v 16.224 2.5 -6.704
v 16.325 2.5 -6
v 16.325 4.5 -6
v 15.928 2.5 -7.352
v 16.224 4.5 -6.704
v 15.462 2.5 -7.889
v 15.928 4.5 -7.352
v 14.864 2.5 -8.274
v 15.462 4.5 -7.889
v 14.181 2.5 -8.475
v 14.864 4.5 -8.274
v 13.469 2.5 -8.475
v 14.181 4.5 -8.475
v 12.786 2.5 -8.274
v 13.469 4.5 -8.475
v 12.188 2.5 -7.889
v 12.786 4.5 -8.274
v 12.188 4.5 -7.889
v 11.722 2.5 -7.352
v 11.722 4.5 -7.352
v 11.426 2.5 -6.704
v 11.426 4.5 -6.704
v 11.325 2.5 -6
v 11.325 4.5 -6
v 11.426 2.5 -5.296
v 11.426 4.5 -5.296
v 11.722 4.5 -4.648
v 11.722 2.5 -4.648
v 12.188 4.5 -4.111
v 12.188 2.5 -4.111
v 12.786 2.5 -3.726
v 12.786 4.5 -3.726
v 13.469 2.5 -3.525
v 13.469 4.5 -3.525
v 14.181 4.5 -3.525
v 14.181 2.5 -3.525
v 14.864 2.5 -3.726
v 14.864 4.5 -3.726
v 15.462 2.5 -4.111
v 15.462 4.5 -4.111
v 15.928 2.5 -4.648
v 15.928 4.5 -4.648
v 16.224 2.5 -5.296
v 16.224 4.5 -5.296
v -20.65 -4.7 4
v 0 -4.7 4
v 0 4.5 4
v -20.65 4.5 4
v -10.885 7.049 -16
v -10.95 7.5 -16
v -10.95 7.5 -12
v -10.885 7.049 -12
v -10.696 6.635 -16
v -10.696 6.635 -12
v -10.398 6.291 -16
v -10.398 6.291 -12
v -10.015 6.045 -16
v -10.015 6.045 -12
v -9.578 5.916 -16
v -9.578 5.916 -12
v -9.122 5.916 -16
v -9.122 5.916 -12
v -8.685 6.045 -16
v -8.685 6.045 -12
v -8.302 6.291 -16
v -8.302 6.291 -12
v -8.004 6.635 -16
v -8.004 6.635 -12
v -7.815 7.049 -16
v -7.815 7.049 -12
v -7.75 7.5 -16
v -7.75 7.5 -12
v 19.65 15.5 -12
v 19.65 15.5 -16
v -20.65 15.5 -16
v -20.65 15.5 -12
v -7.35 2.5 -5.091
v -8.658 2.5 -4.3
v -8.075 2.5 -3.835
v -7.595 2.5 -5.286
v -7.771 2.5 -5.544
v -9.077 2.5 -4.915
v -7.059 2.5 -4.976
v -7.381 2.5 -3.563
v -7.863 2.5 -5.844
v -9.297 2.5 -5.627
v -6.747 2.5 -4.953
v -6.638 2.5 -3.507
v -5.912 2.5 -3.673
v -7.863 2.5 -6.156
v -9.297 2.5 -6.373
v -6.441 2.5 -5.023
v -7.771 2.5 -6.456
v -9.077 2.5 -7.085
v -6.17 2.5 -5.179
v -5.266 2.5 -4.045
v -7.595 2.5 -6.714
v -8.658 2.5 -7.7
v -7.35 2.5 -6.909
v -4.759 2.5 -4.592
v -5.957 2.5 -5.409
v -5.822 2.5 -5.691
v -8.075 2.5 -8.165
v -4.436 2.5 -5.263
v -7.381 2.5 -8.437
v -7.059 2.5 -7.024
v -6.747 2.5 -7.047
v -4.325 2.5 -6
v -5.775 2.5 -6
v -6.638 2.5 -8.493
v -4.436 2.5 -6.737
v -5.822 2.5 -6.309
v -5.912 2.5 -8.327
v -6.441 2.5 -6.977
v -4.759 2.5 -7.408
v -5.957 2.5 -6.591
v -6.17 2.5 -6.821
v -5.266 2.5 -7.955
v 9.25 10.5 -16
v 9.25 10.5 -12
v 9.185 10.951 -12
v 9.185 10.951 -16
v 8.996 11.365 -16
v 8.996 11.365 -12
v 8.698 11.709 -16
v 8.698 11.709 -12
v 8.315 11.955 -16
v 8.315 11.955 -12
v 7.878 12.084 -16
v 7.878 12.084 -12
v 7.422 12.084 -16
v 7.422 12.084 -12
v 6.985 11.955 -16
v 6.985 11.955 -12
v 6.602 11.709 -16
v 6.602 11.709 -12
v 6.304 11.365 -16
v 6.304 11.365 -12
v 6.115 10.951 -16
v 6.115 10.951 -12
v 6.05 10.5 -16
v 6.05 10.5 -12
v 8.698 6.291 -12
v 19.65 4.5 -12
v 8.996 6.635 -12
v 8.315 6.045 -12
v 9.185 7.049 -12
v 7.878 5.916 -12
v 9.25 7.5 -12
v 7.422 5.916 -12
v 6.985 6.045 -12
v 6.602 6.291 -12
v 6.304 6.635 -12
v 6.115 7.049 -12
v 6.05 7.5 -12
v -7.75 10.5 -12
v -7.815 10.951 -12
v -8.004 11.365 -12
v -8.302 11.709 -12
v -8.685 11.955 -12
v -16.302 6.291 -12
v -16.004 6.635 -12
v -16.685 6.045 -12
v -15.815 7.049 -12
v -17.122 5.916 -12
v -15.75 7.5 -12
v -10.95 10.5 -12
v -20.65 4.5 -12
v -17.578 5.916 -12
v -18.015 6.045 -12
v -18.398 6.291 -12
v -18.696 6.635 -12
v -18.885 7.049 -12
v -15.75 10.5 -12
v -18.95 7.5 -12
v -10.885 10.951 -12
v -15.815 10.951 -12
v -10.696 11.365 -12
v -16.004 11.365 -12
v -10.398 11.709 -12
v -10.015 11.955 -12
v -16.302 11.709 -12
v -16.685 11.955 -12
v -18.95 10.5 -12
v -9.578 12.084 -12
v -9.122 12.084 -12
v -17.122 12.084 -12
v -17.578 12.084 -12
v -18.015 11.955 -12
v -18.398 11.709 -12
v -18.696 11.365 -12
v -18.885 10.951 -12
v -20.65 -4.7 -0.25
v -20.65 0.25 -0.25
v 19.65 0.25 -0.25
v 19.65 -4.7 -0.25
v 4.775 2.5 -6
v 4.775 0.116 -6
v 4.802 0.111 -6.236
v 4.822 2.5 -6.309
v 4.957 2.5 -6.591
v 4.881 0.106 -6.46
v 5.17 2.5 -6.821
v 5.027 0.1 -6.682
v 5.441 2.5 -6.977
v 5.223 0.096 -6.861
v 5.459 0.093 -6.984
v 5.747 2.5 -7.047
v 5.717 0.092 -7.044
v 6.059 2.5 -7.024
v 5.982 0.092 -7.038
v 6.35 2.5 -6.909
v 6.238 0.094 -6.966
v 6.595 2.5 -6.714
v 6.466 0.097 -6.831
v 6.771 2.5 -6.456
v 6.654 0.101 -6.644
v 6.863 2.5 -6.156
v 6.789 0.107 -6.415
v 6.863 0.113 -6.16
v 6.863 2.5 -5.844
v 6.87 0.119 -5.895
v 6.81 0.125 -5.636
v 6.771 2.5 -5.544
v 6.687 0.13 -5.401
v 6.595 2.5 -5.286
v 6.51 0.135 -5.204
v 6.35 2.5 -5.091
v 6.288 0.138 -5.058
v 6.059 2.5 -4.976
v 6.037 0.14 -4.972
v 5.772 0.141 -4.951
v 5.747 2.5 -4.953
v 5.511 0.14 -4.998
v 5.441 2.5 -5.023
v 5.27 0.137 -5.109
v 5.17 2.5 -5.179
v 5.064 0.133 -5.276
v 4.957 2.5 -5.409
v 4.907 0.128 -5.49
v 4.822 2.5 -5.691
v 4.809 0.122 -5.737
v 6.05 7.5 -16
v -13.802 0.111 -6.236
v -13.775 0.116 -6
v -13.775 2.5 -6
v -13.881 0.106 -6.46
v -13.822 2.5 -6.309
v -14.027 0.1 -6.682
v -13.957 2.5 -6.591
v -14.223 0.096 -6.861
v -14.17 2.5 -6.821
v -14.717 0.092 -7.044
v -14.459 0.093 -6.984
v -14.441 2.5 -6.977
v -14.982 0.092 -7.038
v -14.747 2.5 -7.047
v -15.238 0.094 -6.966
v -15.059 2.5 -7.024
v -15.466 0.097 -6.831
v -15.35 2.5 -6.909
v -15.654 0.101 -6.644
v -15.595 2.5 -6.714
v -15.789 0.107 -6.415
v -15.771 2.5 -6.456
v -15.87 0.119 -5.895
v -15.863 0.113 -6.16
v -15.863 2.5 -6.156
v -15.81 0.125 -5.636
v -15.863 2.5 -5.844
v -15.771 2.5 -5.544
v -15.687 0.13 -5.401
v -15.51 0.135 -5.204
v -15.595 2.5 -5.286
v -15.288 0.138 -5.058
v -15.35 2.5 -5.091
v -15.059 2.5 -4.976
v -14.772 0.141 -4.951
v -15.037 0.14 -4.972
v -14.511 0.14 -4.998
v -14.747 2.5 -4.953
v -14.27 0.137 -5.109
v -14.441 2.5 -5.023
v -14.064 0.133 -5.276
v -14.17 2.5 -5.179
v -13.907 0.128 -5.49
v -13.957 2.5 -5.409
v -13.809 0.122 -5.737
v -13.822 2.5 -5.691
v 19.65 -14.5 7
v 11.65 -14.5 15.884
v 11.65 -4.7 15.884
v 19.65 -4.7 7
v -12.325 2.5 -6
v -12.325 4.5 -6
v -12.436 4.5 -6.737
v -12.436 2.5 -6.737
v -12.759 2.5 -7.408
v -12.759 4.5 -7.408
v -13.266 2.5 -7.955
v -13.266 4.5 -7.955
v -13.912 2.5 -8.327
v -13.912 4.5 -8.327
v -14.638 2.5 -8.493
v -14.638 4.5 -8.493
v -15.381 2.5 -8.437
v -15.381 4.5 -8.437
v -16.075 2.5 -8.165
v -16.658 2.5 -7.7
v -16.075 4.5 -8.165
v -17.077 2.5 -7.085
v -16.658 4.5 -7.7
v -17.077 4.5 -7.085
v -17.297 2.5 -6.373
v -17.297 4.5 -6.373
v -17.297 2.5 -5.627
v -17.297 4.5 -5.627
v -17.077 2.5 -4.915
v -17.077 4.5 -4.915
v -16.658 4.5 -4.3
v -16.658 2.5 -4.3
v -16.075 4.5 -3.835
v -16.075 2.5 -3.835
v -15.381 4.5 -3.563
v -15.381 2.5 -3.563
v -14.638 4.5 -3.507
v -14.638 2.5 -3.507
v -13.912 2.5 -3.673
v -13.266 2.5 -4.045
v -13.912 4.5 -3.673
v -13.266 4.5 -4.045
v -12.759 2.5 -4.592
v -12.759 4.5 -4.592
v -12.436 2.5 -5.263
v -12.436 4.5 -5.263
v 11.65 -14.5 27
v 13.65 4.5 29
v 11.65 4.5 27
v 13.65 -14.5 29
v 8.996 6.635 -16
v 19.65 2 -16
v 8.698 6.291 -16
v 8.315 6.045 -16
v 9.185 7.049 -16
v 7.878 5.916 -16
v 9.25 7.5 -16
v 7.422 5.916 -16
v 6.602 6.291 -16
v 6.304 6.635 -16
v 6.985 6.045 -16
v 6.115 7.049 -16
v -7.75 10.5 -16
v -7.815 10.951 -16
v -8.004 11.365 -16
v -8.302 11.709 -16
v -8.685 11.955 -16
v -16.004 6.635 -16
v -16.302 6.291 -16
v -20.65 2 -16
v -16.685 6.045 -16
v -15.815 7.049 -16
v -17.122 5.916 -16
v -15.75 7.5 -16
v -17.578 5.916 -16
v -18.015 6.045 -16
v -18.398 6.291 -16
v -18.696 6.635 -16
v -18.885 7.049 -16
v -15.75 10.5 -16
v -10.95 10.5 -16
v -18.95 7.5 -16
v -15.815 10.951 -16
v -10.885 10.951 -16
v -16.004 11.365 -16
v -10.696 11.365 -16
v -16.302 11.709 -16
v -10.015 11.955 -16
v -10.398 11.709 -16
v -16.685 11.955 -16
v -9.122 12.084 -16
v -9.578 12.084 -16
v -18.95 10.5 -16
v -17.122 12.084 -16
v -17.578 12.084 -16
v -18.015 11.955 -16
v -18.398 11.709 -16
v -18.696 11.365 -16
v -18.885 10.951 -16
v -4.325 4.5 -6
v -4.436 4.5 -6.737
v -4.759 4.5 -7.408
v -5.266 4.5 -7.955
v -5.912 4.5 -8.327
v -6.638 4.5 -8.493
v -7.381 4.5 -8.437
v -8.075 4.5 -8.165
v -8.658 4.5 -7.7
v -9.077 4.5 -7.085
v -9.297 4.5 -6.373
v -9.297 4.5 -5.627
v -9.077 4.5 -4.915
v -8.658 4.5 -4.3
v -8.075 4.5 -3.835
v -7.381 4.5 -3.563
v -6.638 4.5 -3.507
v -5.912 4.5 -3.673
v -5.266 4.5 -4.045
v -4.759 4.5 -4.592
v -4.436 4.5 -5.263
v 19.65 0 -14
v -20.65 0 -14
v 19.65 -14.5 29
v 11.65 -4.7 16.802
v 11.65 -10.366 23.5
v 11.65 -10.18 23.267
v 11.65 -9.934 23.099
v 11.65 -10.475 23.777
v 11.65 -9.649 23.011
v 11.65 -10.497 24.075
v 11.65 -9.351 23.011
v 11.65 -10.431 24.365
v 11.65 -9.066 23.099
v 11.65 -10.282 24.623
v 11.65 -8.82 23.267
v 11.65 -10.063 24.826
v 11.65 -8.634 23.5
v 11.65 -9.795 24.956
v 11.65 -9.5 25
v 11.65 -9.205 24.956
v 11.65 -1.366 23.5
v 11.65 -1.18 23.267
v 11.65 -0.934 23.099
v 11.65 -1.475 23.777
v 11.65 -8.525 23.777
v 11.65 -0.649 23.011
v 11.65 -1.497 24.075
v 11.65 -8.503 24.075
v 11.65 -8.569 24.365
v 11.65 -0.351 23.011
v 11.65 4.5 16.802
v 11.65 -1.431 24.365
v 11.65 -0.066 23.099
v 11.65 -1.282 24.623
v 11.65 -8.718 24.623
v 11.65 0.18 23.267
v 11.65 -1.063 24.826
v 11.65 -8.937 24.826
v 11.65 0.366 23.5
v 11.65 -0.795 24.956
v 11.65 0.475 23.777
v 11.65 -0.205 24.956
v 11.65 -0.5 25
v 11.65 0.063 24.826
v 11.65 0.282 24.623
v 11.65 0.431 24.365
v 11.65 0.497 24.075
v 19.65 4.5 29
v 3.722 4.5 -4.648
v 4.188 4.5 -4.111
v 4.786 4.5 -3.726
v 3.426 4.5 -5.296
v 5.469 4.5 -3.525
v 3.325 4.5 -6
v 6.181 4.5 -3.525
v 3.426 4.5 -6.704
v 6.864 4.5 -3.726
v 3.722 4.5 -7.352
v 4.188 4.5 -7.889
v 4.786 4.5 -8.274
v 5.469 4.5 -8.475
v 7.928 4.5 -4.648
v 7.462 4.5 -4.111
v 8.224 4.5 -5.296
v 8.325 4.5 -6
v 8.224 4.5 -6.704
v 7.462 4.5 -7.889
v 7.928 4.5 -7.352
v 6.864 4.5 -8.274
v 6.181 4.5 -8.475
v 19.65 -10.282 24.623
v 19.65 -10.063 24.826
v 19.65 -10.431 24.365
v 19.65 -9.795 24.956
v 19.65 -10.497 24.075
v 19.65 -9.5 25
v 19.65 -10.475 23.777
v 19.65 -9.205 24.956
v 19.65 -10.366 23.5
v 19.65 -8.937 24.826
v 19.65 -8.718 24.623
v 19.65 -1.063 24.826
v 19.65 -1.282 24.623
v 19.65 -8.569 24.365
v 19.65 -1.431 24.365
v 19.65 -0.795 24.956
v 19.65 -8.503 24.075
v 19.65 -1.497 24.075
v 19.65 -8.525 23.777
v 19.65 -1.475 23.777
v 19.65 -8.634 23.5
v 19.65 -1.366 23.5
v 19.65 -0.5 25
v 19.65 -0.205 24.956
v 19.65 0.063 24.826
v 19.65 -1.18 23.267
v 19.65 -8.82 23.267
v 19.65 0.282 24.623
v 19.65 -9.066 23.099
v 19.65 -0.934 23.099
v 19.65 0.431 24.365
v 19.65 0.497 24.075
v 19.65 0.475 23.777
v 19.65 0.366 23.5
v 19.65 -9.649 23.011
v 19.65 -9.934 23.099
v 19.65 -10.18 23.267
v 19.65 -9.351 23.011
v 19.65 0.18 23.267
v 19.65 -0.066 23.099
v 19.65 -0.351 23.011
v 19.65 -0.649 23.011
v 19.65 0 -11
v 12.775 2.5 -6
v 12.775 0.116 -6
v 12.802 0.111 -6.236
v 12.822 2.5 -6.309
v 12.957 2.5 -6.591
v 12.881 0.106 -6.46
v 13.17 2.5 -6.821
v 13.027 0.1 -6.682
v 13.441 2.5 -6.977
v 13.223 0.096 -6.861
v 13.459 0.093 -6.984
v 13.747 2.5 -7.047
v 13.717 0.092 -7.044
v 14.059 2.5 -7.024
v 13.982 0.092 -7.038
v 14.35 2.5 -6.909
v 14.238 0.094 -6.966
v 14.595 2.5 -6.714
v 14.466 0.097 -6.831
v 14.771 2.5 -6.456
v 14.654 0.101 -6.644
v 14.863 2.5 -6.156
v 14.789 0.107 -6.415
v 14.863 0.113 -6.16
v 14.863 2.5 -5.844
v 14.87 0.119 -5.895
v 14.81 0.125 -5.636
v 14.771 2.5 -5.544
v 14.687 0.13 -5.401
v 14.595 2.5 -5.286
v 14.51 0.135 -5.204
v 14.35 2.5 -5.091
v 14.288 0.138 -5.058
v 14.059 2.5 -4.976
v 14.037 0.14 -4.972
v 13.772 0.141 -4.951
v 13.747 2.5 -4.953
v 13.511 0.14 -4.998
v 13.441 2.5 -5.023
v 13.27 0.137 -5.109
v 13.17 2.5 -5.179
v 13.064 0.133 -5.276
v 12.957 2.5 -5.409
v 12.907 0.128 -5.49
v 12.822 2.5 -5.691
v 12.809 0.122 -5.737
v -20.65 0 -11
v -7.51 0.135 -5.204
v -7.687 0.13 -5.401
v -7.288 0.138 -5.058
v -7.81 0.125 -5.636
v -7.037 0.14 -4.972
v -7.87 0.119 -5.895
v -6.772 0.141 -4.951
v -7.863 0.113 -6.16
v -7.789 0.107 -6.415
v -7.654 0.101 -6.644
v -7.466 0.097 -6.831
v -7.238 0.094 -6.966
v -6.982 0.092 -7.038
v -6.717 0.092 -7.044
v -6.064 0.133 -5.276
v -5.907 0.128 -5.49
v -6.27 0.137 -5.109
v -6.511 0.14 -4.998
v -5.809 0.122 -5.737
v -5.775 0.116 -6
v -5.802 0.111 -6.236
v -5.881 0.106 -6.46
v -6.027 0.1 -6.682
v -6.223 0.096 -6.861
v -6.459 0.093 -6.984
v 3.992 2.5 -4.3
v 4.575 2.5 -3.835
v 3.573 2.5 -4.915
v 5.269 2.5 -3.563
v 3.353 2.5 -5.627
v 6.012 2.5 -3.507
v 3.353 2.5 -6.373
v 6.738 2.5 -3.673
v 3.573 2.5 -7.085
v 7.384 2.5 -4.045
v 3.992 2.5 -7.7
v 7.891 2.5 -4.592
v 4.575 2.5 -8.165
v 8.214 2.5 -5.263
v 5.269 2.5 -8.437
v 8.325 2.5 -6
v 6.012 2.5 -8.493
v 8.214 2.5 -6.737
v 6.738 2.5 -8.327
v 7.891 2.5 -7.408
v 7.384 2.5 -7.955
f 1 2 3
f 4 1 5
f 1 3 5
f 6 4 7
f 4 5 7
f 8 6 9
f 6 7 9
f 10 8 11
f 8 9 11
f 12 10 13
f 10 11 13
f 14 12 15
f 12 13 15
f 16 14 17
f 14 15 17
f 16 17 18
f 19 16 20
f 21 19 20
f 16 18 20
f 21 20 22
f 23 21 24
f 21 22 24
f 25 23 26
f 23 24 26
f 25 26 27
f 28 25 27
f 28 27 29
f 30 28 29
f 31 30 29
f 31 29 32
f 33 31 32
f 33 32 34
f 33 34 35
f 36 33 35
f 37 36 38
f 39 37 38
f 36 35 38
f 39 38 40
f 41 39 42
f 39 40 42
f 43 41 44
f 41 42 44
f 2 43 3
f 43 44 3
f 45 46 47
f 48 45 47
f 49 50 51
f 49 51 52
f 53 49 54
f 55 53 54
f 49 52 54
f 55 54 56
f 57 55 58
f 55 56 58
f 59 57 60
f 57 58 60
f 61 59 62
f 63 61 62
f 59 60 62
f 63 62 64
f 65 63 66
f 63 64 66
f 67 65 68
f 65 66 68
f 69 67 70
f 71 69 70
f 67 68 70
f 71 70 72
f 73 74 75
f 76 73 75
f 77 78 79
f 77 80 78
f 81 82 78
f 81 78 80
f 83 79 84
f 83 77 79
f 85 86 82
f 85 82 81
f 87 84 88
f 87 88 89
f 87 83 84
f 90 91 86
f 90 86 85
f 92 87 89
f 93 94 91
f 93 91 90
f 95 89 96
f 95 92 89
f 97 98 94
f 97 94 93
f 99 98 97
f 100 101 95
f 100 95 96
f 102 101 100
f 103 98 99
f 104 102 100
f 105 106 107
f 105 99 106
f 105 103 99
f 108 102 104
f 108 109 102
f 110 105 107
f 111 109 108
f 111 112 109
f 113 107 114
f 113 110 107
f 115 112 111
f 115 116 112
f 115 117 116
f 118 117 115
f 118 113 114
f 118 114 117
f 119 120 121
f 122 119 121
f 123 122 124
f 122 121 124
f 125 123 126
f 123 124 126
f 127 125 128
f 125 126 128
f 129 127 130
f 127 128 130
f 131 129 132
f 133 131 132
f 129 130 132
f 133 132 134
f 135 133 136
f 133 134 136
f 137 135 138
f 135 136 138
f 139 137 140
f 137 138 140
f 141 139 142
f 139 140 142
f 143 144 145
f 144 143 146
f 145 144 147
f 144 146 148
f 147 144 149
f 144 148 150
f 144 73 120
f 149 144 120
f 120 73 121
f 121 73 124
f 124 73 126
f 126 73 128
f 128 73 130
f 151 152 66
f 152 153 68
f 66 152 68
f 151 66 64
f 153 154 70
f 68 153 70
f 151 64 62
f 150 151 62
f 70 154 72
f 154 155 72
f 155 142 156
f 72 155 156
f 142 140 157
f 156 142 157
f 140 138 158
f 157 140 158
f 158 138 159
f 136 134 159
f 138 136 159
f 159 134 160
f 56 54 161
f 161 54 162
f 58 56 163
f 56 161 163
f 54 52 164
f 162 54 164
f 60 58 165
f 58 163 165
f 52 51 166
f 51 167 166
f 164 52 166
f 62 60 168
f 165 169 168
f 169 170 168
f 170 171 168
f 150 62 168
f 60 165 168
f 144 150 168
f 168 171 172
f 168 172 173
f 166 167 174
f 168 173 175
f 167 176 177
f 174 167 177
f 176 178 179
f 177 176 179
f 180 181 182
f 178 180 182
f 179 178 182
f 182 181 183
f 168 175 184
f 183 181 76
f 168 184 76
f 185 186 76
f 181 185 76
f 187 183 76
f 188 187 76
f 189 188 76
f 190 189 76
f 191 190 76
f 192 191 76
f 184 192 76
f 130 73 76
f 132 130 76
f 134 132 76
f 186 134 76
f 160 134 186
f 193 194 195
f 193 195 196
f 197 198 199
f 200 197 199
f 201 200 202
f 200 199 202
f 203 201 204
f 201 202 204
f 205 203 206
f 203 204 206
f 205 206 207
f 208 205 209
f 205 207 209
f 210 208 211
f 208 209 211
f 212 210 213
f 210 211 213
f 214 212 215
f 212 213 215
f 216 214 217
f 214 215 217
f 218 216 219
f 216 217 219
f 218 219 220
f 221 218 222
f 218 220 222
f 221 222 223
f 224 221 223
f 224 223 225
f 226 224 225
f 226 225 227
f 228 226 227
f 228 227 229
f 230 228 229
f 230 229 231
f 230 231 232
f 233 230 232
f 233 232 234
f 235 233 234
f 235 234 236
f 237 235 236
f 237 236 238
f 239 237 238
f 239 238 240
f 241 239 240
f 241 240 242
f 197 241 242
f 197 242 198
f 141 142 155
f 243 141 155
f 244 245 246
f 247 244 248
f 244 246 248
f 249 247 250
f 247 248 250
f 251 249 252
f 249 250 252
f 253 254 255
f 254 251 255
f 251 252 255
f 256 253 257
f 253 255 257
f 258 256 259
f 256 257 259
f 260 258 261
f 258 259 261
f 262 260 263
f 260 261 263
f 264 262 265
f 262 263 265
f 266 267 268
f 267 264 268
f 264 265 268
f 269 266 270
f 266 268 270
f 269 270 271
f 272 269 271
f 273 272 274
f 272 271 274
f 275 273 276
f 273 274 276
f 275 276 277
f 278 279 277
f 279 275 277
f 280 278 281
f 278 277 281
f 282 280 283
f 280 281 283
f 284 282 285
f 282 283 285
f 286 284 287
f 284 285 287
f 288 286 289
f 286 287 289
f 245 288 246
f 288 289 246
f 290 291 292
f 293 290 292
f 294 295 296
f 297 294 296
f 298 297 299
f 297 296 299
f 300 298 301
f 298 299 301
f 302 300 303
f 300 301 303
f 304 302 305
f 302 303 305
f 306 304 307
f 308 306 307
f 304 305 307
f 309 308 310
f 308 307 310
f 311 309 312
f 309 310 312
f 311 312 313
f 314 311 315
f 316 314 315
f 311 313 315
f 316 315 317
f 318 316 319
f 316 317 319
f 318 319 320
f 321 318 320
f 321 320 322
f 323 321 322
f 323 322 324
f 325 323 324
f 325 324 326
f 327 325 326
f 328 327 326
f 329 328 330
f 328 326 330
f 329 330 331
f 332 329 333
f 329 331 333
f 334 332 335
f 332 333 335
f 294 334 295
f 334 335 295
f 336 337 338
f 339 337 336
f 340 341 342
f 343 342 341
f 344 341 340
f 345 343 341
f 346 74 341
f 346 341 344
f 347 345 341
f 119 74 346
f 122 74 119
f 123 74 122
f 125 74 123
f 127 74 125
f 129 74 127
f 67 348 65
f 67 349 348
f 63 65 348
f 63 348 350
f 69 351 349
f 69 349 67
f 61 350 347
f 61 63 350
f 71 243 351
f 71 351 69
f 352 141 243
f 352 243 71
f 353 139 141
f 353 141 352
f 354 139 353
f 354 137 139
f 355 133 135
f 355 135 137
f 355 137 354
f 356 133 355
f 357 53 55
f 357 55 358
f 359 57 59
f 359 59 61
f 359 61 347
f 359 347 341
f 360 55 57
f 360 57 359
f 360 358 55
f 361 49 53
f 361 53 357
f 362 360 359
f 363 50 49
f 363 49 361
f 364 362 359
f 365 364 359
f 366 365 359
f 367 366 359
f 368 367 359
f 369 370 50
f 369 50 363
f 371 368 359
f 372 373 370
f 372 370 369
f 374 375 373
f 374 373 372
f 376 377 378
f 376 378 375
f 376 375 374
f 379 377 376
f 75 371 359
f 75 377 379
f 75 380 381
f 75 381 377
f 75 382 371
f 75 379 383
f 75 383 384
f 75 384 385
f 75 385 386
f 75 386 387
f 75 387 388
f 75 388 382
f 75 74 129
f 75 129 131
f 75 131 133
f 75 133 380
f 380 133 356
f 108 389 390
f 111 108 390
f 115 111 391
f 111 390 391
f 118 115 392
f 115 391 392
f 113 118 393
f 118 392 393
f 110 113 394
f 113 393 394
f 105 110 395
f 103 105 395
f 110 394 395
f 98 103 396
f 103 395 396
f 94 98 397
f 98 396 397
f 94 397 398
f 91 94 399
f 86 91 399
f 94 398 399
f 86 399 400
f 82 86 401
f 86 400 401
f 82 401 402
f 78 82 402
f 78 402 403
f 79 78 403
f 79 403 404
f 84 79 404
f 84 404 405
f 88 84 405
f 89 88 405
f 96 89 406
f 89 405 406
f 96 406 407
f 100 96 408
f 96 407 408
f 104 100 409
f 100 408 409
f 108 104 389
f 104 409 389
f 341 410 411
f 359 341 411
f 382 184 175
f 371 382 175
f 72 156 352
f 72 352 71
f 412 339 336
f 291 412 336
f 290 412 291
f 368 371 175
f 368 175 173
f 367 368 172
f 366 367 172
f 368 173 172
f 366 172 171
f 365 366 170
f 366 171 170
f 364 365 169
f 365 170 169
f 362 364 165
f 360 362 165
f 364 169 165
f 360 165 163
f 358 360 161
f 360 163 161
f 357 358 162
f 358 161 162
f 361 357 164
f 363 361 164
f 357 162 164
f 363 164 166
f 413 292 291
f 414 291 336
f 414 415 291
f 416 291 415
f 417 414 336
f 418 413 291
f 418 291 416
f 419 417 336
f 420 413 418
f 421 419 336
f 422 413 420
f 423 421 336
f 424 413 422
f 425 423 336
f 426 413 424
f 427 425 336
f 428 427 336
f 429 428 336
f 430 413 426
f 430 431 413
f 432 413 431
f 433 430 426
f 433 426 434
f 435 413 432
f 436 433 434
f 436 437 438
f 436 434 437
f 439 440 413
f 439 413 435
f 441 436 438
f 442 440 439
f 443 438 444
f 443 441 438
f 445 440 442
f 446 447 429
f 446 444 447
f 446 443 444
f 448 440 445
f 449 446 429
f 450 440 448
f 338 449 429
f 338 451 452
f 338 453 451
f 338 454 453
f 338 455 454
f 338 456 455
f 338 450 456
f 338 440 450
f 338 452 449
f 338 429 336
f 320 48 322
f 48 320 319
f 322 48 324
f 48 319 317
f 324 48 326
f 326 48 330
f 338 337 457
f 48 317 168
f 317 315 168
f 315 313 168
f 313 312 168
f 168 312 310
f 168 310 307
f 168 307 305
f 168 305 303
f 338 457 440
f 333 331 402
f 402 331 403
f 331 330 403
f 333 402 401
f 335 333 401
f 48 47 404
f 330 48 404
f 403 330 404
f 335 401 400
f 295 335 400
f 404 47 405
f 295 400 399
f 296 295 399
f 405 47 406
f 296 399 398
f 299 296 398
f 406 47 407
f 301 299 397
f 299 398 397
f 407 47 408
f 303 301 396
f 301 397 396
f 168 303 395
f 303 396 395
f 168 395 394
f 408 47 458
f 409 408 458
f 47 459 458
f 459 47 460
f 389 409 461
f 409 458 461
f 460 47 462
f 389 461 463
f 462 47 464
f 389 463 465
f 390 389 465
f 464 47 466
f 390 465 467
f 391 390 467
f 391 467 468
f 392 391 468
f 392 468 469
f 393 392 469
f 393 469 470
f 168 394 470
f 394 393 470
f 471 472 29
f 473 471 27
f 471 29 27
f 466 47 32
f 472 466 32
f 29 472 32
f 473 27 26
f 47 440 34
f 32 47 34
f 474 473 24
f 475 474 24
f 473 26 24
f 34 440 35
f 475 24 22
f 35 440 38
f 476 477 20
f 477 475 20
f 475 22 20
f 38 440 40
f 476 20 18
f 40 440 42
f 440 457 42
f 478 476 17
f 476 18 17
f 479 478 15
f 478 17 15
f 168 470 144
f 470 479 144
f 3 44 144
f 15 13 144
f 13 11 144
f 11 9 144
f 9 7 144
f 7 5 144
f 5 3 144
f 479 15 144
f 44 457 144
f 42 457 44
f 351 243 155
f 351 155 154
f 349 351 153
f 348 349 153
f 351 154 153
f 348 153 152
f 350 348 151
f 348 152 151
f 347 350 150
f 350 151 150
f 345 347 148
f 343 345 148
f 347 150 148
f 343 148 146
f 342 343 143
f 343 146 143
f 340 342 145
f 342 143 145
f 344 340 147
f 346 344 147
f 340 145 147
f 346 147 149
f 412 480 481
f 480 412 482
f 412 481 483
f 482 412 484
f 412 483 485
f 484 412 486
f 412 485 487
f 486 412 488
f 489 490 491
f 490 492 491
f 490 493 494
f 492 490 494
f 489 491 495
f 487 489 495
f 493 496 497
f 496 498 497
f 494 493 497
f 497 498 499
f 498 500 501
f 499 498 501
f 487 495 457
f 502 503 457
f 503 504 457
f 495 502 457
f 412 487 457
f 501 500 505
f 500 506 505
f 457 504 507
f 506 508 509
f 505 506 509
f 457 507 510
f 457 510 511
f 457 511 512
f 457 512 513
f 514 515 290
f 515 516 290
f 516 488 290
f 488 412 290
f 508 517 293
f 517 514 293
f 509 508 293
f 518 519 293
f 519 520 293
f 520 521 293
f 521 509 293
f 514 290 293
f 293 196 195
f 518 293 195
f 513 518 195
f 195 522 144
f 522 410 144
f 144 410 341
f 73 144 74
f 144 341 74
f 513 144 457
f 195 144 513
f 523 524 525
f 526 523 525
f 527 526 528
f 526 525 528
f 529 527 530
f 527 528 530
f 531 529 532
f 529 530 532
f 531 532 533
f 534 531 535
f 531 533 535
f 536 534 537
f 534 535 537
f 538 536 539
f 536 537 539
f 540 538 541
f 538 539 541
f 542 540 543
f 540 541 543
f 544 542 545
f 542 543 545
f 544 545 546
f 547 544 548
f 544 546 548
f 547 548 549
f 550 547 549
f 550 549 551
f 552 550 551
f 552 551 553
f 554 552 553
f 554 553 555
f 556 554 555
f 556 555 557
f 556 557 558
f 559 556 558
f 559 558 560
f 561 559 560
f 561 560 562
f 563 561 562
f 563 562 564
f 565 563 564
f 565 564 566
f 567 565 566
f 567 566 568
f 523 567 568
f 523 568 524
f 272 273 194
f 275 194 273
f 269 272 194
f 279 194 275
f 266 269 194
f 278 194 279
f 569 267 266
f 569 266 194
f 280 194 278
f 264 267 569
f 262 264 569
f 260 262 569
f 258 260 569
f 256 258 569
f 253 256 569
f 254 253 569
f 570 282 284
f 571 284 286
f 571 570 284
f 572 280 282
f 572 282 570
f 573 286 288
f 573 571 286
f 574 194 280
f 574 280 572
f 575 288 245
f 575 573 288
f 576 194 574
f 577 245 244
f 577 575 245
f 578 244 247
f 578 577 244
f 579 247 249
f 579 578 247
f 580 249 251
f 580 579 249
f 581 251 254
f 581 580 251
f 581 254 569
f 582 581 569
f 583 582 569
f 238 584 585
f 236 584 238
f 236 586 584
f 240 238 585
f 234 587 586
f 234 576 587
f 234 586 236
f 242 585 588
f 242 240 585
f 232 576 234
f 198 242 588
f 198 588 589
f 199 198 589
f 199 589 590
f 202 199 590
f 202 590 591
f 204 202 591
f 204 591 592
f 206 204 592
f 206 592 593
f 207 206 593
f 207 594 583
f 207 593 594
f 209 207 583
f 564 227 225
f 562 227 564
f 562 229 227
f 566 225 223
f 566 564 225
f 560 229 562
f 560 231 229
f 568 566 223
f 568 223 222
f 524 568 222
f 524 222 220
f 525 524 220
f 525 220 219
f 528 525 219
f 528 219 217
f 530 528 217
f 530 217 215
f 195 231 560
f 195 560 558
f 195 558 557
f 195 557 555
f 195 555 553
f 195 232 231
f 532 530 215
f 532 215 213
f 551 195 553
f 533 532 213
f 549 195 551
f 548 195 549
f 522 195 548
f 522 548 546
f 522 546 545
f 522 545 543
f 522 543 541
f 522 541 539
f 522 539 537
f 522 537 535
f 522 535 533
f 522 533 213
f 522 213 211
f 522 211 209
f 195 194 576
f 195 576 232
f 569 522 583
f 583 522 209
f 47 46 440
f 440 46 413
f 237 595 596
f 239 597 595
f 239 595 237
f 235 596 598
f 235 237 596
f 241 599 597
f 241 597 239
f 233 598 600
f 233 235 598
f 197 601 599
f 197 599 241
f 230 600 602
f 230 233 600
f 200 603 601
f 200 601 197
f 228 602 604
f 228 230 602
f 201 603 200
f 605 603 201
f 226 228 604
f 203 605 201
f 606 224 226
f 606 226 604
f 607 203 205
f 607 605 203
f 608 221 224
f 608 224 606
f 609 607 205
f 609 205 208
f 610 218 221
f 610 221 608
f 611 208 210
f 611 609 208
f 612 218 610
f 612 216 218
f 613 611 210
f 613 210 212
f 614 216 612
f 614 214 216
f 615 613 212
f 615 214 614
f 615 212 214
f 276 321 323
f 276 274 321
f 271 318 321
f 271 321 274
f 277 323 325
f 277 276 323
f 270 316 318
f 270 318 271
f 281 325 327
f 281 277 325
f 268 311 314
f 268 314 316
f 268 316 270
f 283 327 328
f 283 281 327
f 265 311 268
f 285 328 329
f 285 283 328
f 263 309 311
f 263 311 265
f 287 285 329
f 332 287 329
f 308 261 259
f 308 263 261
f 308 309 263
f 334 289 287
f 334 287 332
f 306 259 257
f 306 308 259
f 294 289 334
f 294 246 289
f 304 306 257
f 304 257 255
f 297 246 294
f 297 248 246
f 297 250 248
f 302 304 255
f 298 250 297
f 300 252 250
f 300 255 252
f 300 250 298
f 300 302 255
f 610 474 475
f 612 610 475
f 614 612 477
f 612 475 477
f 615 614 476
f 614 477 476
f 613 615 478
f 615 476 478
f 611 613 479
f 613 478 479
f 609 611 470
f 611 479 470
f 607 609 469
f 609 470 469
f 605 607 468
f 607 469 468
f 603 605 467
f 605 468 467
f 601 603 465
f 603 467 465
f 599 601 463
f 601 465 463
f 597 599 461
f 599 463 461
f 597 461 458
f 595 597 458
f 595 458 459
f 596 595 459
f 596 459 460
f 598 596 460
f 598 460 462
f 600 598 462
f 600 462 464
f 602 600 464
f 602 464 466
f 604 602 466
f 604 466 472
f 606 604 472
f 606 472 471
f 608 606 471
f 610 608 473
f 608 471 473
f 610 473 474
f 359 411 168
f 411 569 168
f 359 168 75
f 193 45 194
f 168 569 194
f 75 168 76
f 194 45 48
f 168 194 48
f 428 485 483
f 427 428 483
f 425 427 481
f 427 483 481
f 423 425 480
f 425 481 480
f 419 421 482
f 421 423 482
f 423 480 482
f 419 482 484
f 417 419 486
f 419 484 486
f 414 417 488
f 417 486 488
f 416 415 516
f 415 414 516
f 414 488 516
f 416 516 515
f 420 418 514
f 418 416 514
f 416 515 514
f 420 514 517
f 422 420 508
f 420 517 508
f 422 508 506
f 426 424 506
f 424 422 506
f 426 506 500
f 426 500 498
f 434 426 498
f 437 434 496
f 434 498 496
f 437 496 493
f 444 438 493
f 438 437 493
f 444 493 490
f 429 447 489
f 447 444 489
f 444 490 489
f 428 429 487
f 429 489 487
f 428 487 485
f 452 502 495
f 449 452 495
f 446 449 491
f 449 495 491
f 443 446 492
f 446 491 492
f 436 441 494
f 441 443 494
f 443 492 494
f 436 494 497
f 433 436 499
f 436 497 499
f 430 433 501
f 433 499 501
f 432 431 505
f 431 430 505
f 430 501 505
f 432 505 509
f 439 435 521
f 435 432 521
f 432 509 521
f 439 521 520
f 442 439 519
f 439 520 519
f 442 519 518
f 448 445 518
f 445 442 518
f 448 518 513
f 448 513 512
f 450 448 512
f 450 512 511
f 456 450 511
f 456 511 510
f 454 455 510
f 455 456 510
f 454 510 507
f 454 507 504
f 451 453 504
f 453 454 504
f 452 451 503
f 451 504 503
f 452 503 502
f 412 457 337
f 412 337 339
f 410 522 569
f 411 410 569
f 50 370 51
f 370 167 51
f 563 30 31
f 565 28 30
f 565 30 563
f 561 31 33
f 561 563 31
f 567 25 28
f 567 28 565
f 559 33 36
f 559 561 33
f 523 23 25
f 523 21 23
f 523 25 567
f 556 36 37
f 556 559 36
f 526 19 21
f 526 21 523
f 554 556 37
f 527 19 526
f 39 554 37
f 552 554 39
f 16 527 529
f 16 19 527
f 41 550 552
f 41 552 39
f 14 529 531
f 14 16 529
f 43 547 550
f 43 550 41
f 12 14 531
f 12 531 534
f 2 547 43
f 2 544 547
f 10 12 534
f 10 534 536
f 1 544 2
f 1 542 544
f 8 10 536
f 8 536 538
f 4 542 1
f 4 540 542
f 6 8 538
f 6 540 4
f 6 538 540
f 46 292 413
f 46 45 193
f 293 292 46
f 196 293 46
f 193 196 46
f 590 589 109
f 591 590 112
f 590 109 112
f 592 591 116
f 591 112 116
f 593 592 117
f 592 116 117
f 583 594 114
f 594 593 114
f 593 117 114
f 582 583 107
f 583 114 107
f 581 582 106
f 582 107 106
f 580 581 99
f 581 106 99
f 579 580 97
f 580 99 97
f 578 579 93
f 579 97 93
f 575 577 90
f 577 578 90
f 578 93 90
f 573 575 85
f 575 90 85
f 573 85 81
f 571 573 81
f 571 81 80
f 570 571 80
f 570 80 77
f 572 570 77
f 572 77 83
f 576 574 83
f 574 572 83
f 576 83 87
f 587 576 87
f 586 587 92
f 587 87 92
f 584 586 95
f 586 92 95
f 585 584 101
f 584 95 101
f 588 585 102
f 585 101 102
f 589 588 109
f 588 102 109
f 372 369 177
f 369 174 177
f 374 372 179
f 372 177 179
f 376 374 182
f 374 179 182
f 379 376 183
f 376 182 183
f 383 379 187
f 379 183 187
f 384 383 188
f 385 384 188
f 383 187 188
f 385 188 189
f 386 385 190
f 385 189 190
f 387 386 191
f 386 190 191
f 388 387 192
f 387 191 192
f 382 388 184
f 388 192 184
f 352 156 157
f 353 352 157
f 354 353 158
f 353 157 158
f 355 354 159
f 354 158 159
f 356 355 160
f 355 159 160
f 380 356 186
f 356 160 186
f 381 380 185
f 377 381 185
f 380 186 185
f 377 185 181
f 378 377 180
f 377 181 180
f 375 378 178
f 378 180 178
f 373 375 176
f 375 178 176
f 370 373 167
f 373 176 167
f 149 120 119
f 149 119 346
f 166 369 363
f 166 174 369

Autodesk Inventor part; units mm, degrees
ref_plane "YZ Plane" through (0, 0, 0) normal (1, 0, 0) x (0, 1, 0)
ref_plane "XZ Plane" through (0, 0, 0) normal (0, 1, 0) x (-1, 0, 0)
ref_plane "XY Plane" through (0, 0, 0) normal (0, 0, 1) x (1, 0, 0)
sketch "Sketch1" plane through (0, 0, 0) normal (0, 1, 0) x (-1, 0, 0)
  line L0 (0, 0) -> (-19.65, 0)
  line L1 (-19.65, 0) -> (-19.65, -12)
  line L2 (-19.65, -12) -> (0, -12)
  line L3 (0, -12) -> (0, 0)
  line L4 (0, 0) -> (0, -6)
  line L5 (0, -6) -> (-5.825, -6)
  line L6 (-5.825, -6) -> (-13.825, -6)
  circle A0 centre (-5.825, -6) radius 1.05
  circle A1 centre (-13.825, -6) radius 1.05
  dimension "d0" = 19.65
  dimension "d1" = 12
  dimension "d2" = 6
  dimension "d3" = 5.825
  dimension "d4" = 8
  dimension "d5" = 2.1
  dimension "d6" = 2.1
extrude "Extrusion1" add sketch "Sketch1" along normal blind 4.5
sketch "Sketch2" plane through (0, 4.5, 0) normal (0, 1, 0) x (1, 0, 0)
  line L0 (0, 0) -> (19.65, 0) projected
  line L1 (0, 0) -> (0, 6)
  line L2 (0, 12) -> (0, 0) projected
  line L3 (0, 6) -> (5.825, 6)
  line L4 (5.825, 6) -> (13.825, 6)
  circle A0 centre (5.825, 6) radius 2.5
  circle A1 centre (13.825, 6) radius 2.5
  dimension "d9" = 5.825
  dimension "d10" = 8
  dimension "d11" = 5
  dimension "d12" = 5
extrude "Extrusion2" cut sketch "Sketch2" against normal blind 2
sketch "Sketch3" plane through (0, 4.5, 0) normal (0, 1, 0) x (1, 0, 0)
  line L0 (19.65, 12) -> (0, 12) projected
  line L1 (0, 0) -> (3, 0)
  line L2 (3, 0) -> (3, 12)
  line L3 (3, 12) -> (0, 12)
  line L4 (0, 12) -> (0, 0)
  dimension "d15" = 3
extrude "Extrusion3" add sketch "Sketch3" along normal blind 11.5
sketch "Sketch4" plane through (0, 16, 0) normal (0, 1, 0) x (1, 0, 0)
  line L0 (0, 0) -> (3, 0) projected
  line L1 (0, 0) -> (3, 0)
  line L2 (3, 0) -> (3, 1)
  line L3 (3, 0) -> (3, 12) projected
  line L4 (3, 1) -> (2, 1)
  line L5 (2, 1) -> (2, 11)
  line L6 (2, 11) -> (3, 11)
  line L7 (3, 1) -> (3, 11)
  dimension "d18" = 1
  dimension "d19" = 1
  dimension "d20" = 10
extrude "Extrusion4" cut sketch "Sketch4" against normal blind 11.5
sketch "Sketch6" plane through (0, 0, 0) normal (0, 0, 1) x (1, 0, 0)
  line L0 (0, 0) -> (19.65, 0) projected
  line L1 (0, 0) -> (5, 0)
  line L2 (5, 0) -> (5, 4.5)
  line L3 (3.325, 4.5) -> (8.325, 4.5) projected
  line L4 (19.65, 0) -> (19.65, 4.5) projected
  line L5 (19.65, 4.5) -> (19.65, 0)
  line L6 (19.65, 0) -> (5, 0)
  line L7 (5, 4.5) -> (19.65, 4.5)
  line L8 (19.65, 0) -> (5, 0)
  line L9 (19.65, 4.5) -> (19.65, -3.5)
  line L10 (5, 4.5) -> (-3, 4.5)
  line L11 (3, 4.5) -> (19.65, 4.5) projected
  line L12 (5, 4.5) -> (5, -3.5)
  line L13 (5, -3.5) -> (19.65, -3.5)
  dimension "d24" = 5
  dimension "d25" = 8
  dimension "d26" = 8
  dimension "d27" = 8
extrude "Extrusion5" add sketch "Sketch6" along normal blind 2
sketch "Sketch7" plane through (0, 0, 2) normal (0, 0, 1) x (1, 0, 0)
  line L0 (5, 0) -> (5, -3.5) projected
  line L1 (5, -3.5) -> (11, -3.5)
  line L2 (11, -3.5) -> (11, 4.5)
  line L3 (11, 4.5) -> (5, 4.5)
  line L4 (5, 4.5) -> (5, -3.5)
  line L5 (5, -3.5) -> (19.65, -3.5) projected
  line L6 (5, -3.5) -> (11, -3.5)
  line L7 (11, -3.5) -> (11, -14.5)
  line L8 (11, -14.5) -> (5, -14.5)
  line L9 (5, -14.5) -> (5, -3.5)
  point P0 (0, 0)
  dimension "d30" = 6
  dimension "d31" = 8
  dimension "d32" = 6
  dimension "d33" = 11
extrude "Extrusion6" add sketch "Sketch7" along normal blind 27
sketch "Sketch8" plane through (11, -14.5, 2) normal (1, 0, 0) x (0, 0, -1)
  line L0 (0, 11) -> (0, 0) projected
  line L1 (0, 0) -> (-27, 0)
  line L2 (0, 0) -> (-27, 0) projected
  line L3 (-27, 0) -> (-27, 5)
  line L4 (2, 19) -> (-27, 19) projected
  circle A0 centre (-27, 5) radius 2
  line L5 (0, 19) -> (-27, 19)
  line L6 (-27, 19) -> (-27, 14)
  circle A1 centre (-27, 14) radius 2
  line L7 (-27, 14) -> (-22, 14)
  line L8 (-27, 5) -> (-22, 5)
  circle A2 centre (-22, 14) radius 1.9305
  circle A3 centre (-22, 5) radius 1.9305
  point P0 (2, 14.5)
  point P1 (-25, 14)
  point P2 (-27, 16)
  point P3 (-25, 5)
  point P4 (-27, 3)
  dimension "d36" = 27
  dimension "d37" = 5
  dimension "d39" = 4
  dimension "d41" = 27
  dimension "d42" = 5
  dimension "d43" = 4
  dimension "d44" = 5
  dimension "d45" = 5
  dimension "d46" = 3.861
  dimension "d47" = 3.861
sketch "Sketch10" plane through (11, -14.5, 2) normal (1, 0, 0) x (0, 0, -1)
  line L0 (0, 0) -> (-27, 0) projected
  line L1 (0, 0) -> (-5, 0)
  line L2 (-5, 0) -> (-5, 11)
  line L3 (-5, 11) -> (0, 11)
  line L4 (0, 11) -> (0, 0)
  point P0 (2, 14.5)
  point P1 (-5, 0)
  dimension "d52" = 5
  dimension "d53" = 11
extrude "Extrusion9" cut sketch "Sketch10" against normal blind 20
sketch "Sketch11" plane through (11, -3.5, 2) normal (1, 0, 0) x (0, 0, -1)
  line L0 (-27, 8) -> (0, 8)
  line L1 (0, 8) -> (0, -11)
  line L2 (0, -11) -> (-27, -11)
  line L3 (-27, -11) -> (-27, 8)
  line L4 (-5, 0) -> (0, 0) projected
  line L5 (-5, 0) -> (0, 0)
  line L6 (0, 0) -> (0, -11)
  line L7 (0, -11) -> (-5, -11)
  line L8 (-5, -11) -> (-5, 0)
  point P0 (2, 3.5)
  dimension "d56" = 27
  dimension "d57" = 19
extrude "Extrusion10" add sketch "Sketch11" along normal blind 16 contours L0 L1 L4 L8 L2 L3
sketch "Sketch13" plane through (5, -3.5, 0) normal (-1, 0, 0) x (0, 0, 1)
  line L0 (0, 3.5) -> (0, 8) projected
  line L1 (0, 8) -> (30.196, 8)
  line L2 (30.196, 8) -> (30.196, -11.8084)
  line L3 (30.196, -11.8084) -> (0, -11.8084)
  line L4 (0, -11.8084) -> (0, 8)
extrude "Extrusion12" cut sketch "Sketch13" against normal blind 12.5
extrude "Extrusion13" cut sketch "Sketch8" along normal blind 30 contours A3 | A2
sketch "Sketch14" plane through (0, 0, -12) normal (-1, 0, 0) x (0, 0, 1)
  line L0 (12, 4.5) -> (12, 16) projected
  line L1 (12, 4.5) -> (16, 4.5)
  line L2 (14, 4.5) -> (41, 4.5) projected
  line L3 (12, 4.5) -> (12, 0) projected
  line L4 (16, 4.5) -> (12, 4.5)
  line L5 (12, 4.5) -> (12, 0)
  line L6 (12, 0) -> (16, 0)
  line L7 (16, 0) -> (16, 4.5)
  line L8 (16, 0) -> (12, 0)
  line L9 (12, 0) -> (12, -3.5)
  line L10 (12, -3.5) -> (16, -3.5)
  line L11 (16, -3.5) -> (16, 0)
  dimension "d68" = 4
  dimension "d69" = 3.5
extrude "Extrusion14" add sketch "Sketch14" against normal blind 27
sketch "Sketch15" plane through (27, -3.5, 2) normal (1, 0, 0) x (0, 0, -1)
  line L0 (-27.7224, 9.1153) -> (2, 9.1153)
  line L1 (2, 9.1153) -> (2, -11.9629)
  line L2 (2, -11.9629) -> (-27.7224, -11.9629)
  line L3 (-27.7224, -11.9629) -> (-27.7224, 9.1153)
  point P0 (2, 3.5)
extrude "Extrusion15" cut sketch "Sketch15" against normal blind 3.5
sketch "Sketch16" plane through (0, 0, 0) normal (0, 0, -1) x (-1, 0, 0)
  line L0 (-23.5, 4.5) -> (-23.5, -3.5) projected
  line L1 (-19.65, 0) -> (0, 0) projected
  line L2 (-23.5, 4.5) -> (-19.65, 4.5)
  line L3 (-19.65, 4.5) -> (-19.65, 0)
  line L4 (-19.65, 0) -> (-23.5, 0)
  line L5 (-23.5, 0) -> (-23.5, 4.5)
  line L6 (0, -3.5) -> (-23.5, -3.5) projected
  line L7 (-23.5, -3.5) -> (0, -3.5)
  line L8 (0, -3.5) -> (0, 0)
  line L9 (0, 0) -> (-23.5, 0)
  line L10 (-23.5, 0) -> (-23.5, -3.5)
extrude "Extrusion16" cut sketch "Sketch16" against normal blind 0.25
chamfer "Chamfer2" distance 11.5 angle 22.5 1 edges at (3, 4.5, -0.5) measured on face at (3, 8.3333, -0.6667)
chamfer "Chamfer3" distance 11.5 angle 22.5 1 edges at (3, 4.5, -11.5) measured on face at (3, 8.3333, -11.3333)
sketch "Sketch17" plane through (17.5, -3.5, 0) normal (-1, 0, 0) x (0, 0, 1)
  line L0 (4, 8) -> (0, 8) projected
  line L1 (4, 8) -> (29, 8) projected
  line L2 (4, 8) -> (29, 8)
  line L3 (29, -11) -> (7, -11) projected
  line L4 (29, 8) -> (29, -11)
  line L5 (29, -11) -> (7, -11)
  line L6 (7, -11) -> (7, 0) projected
  line L7 (7, -11) -> (7, 0)
  line L8 (7, 0) -> (4, 0) projected
  line L9 (7, 0) -> (4, 0)
  line L10 (4, 0) -> (4, 8) projected
  line L11 (4, 0) -> (4, 8)
  circle A0 centre (24, 3) radius 1.9305 projected
  circle A1 centre (24, 3) radius 1.9305
  circle A2 centre (24, -6) radius 1.9305 projected
  circle A3 centre (24, -6) radius 1.9305
  point P0 (0, 3.5)
extrude "Extrusion17" add sketch "Sketch17" along normal blind 7.75
sketch "Sketch19" plane through (19.65, 0, -12) normal (1, 0, 0) x (0, 0, -1)
  line L0 (3.0047, 17.6779) -> (-43.6886, 17.6779)
  line L1 (-43.6886, 17.6779) -> (-43.6886, -24.1526)
  line L2 (-43.6886, -24.1526) -> (3.0047, -24.1526)
  line L3 (3.0047, -24.1526) -> (3.0047, 17.6779)
  point P0 (-12, 0)
extrude "Extrusion18" cut sketch "Sketch19" along normal blind 7.75
sketch "Sketch20" plane through (19.65, 0, -12) normal (1, 0, 0) x (0, 0, -1)
  line L0 (-16, -3.5) -> (-19, -3.5) projected
  line L1 (-41, 4.5) -> (-16, 4.5) projected
  line L2 (-16, -3.5) -> (-41, -3.5)
  line L3 (-41, -3.5) -> (-41, 4.5)
  line L4 (-41, 4.5) -> (-16, 4.5)
  line L5 (-16, 4.5) -> (-16, -3.5)
  line L6 (-19, -3.5) -> (-19, -14.5) projected
  line L7 (0, 4.5) -> (-41, 4.5) projected
  line L8 (-19, -14.5) -> (-41, -14.5)
  line L9 (-41, -14.5) -> (-41, 4.5)
  line L10 (-41, 4.5) -> (-19, 4.5)
  line L11 (-19, 4.5) -> (-19, -14.5)
  point P0 (-12, 0)
extrude "Extrusion19" cut sketch "Sketch20" against normal blind 3.4
sketch "Sketch22" plane through (9.75, -3.5, 0) normal (-1, 0, 0) x (0, 0, 1)
  line L0 (29, 8) -> (4, 8) projected
  line L1 (29, -11) -> (29, 8) projected
  line L2 (4, 8) -> (29, 8)
  line L3 (29, 8) -> (29, -11)
  line L4 (29, -11) -> (4, -11)
  line L5 (4, -11) -> (4, 8)
  point P0 (0, 3.5)
extrude "Extrusion21" cut sketch "Sketch22" against normal blind 0.5
chamfer "Chamfer6" distance 6 angle 45 1 edges at (10.25, 0.5, 4)
sketch "Sketch23" plane through (10.25, -3.5, 0) normal (-1, 0, 0) x (0, 0, 1)
  line L0 (0.25, 0) -> (4, 0) projected
  line L1 (29, -11) -> (0.25, -11)
  line L2 (0.25, -11) -> (0.25, 0)
  line L3 (0.25, 0) -> (29, 0)
  line L4 (29, 0) -> (29, -11)
  point P0 (0, 3.5)
extrude "Extrusion22" cut sketch "Sketch23" along normal blind 6
chamfer "Chamfer7" distance 3 angle 45 1 edges at (10.25, -9, 7)
sketch "Sketch24" plane through (2, 4.5, -11) normal (0, 0, 1) x (1, 0, 0)
  line L0 (0, 11.5) -> (0, 0) projected
  line L1 (0, 11.5) -> (1, 11.5) projected
  line L2 (0, 11.5) -> (1, 11.5)
  line L3 (1, 11.5) -> (5.7635, 0) projected
  line L4 (1, 11.5) -> (5.7635, 0)
  line L5 (5.7635, 0) -> (0, 0)
  line L6 (0, 0) -> (0, 11.5)
  point P0 (-2, -4.5)
extrude "Extrusion23" add sketch "Sketch24" along normal blind 1
sketch "Sketch25" plane through (19.65, 0, -12) normal (0, 0, -1) x (-1, 0, 0)
  line L0 (11.8865, 4.5) -> (16.65, 16) projected
  line L1 (11.8865, 4.5) -> (21.5602, 4.5)
  line L2 (21.5602, 4.5) -> (21.5602, 16.6717)
  line L3 (21.5602, 16.6717) -> (11.8865, 16.6717)
  line L4 (11.8865, 16.6717) -> (11.8865, 4.5)
  point P0 (19.65, 0)
extrude "Extrusion24" cut sketch "Sketch25" against normal blind 1
sketch "Sketch26" plane through (19.65, 0, -12) normal (0, 0, -1) x (-1, 0, 0)
  line L0 (23.0227, -5.5896) -> (-3.5888, -5.5896)
  line L1 (-3.5888, -5.5896) -> (-3.5888, 1.5983)
  line L2 (23.0227, 1.5983) -> (23.0227, -5.5896)
  line L3 (23.0227, -5.5896) -> (-3.178, -5.5896)
  line L4 (-3.178, -5.5896) -> (-3.178, 11.4907)
  line L5 (-3.178, 11.4907) -> (23.0227, 11.4907)
  line L6 (23.0227, 11.4907) -> (23.0227, -5.5896)
  point P0 (19.65, 0)
extrude "Extrusion25" cut sketch "Sketch26" against normal blind 1
sketch "Sketch27" plane through (0, 0, 0.25) normal (0, 0, -1) x (-1, 0, 0)
  line L0 (-19.65, 0) -> (0, 0) projected
  line L1 (-19.65, -3.5) -> (-16.25, -3.5) projected
  line L2 (0, 0) -> (-19.65, 0)
  line L3 (-19.65, 0) -> (-19.65, -3.5)
  line L4 (-19.65, -3.5) -> (0, -3.5)
  line L5 (0, -3.5) -> (0, 0)
extrude "Extrusion26" add sketch "Sketch27" along normal blind 0.25
sketch "Sketch28" plane through (0, 0, 0) normal (0, 0, -1) x (-1, 0, 0)
  line L0 (0, 0) -> (-19.65, 0) projected
  line L1 (-19.65, 0) -> (-19.65, -3.5) projected
  line L2 (0, 0) -> (-19.65, 0)
  line L3 (-19.65, 0) -> (-19.65, -3.5)
  line L4 (-19.65, -3.5) -> (0, -3.5)
  line L5 (0, -3.5) -> (0, 0)
extrude "Extrusion27" add sketch "Sketch28" along normal blind 0.25
sketch "Sketch29" plane through (16.25, 0, -12) normal (1, 0, 0) x (0, 0, -1)
  line L0 (-16, -3.5) -> (-16, 4.5) projected
  line L1 (-19, -14.5) -> (-41, -14.5) projected
  line L2 (-16, 4.5) -> (-41, 4.5)
  line L3 (-41, 4.5) -> (-41, -14.5)
  line L4 (-41, -14.5) -> (-16, -14.5)
  line L5 (-16, -14.5) -> (-16, 4.5)
  line L6 (-19, -3.5) -> (-19, -14.5) projected
  line L7 (-19, -3.5) -> (-16, -3.5)
  line L8 (-16, -3.5) -> (-16, -14.5)
  line L9 (-16, -14.5) -> (-19, -14.5)
  line L10 (-19, -14.5) -> (-19, -3.5)
  circle A0 centre (-36, -0.5) radius 1.9305 projected
  circle A1 centre (-36, -0.5) radius 1.9305
  circle A2 centre (-36, -9.5) radius 1.9305 projected
  circle A3 centre (-36, -9.5) radius 1.9305
  point P0 (-12, 0)
extrude "Extrusion28" add sketch "Sketch29" along normal blind 3.4 contours L7 L6 L1 L3 L2 L0
sketch "Sketch30" plane through (0, -3.5, 4) normal (0, -1, 0) x (1, 0, 0)
  line L0 (19.65, 3) -> (19.65, -4.25) projected
  line L1 (0, -15) -> (0, -4.25) projected
  line L2 (0, 3) -> (0, -4.25)
  line L3 (0, -4.25) -> (19.65, -4.25)
  line L4 (19.65, -4.25) -> (19.65, 3)
  line L5 (10.25, 6) -> (13.25, 3) projected
  line L6 (13.25, 3) -> (10.25, 6)
  line L7 (10.25, 6) -> (7.25, 3)
  line L8 (10.25, 6) -> (4.25, 0) projected
  line L9 (0, 0) -> (4.25, 0) projected
  line L10 (7.25, 3) -> (4.25, 0)
  line L11 (19.65, 3) -> (13.25, 3)
  line L12 (7.25, 3) -> (0, 3)
  point P0 (0, -4)
extrude "Extrusion29" add sketch "Sketch30" along normal blind 1.2 contours L0 L3 L2 L9 L8 L7 L5 L11
sketch "Sketch31" plane through (10.25, -3.5, 0) normal (-1, 0, 0) x (0, 0, 1)
  line L0 (29, 8) -> (29, -11) projected
  line L1 (29, -11) -> (10, -11) projected
  line L2 (29, 8) -> (19, 8)
  line L3 (19, 8) -> (19, -11)
  line L4 (19, -11) -> (29, -11)
  line L5 (29, -11) -> (29, 8)
  point P0 (0, 3.5)
  dimension "d126" = 10
extrude "Extrusion30" cut sketch "Sketch31" against normal blind 3.4
sketch "Sketch32" plane through (0, 4.5, 0) normal (0, 1, 0) x (1, 0, 0)
  line L0 (13.65, -19) -> (10.25, -19) projected
  line L1 (10.25, -19) -> (10.25, -10) projected
  line L2 (13.65, -19) -> (10.25, -10)
  line L3 (10.25, -10) -> (7.9334, -20.7068)
  line L4 (7.9334, -20.7068) -> (13.65, -19)
  point P0 (0, 0)
extrude "Extrusion31" cut sketch "Sketch32" against normal blind 20 contours L0 L1 L2
sketch "Sketch38" plane through (0, -4.7, 4) normal (0, -1, 0) x (1, 0, 0)
  line L0 (13.65, 15) -> (13.65, 3)
  line L1 (13.25, 3) -> (19.65, 3) projected
  line L2 (13.65, 3) -> (6.6933, 3)
  line L3 (10.25, 6) -> (13.65, 15) projected
  line L4 (6.6933, 3) -> (13.65, 15)
  point P0 (0, -4)
extrude "Extrusion35" cut sketch "Sketch38" along normal blind 20
sketch "Sketch39" plane through (0, -4.7, 4) normal (0, -1, 0) x (1, 0, 0)
  line L0 (10.25, 6) -> (13.65, 15) projected
  line L1 (10.25, 6) -> (10.9568, 7.8709)
  line L2 (10.9568, 7.8709) -> (13.65, 7.8709)
  line L3 (13.65, 3) -> (13.65, 15) projected
  line L4 (13.65, 3) -> (10.9568, 3)
  line L5 (10.9568, 3) -> (10.9568, 7.8709)
  line L6 (10.9568, 7.8709) -> (13.65, 7.8709)
  line L7 (13.65, 7.8709) -> (13.65, 3)
  point P0 (0, -4)
  dimension "d150" = 2
extrude "Extrusion36" add sketch "Sketch39" along normal blind 9.8 contours L2 L3 L4 L5
sketch "Sketch40" plane through (0, -4.7, 4) normal (0, -1, 0) x (1, 0, 0)
  line L0 (10.25, 6) -> (10.9568, 7.8709) projected
  line L1 (13.65, 25) -> (13.65, 7.8709) projected
  line L2 (10.9568, 7.8709) -> (13.65, 7.8709)
  line L3 (13.65, 15) -> (13.65, 25) projected
  line L4 (13.65, 7.8709) -> (13.65, 15)
  line L5 (10.9568, 7.8709) -> (13.65, 15) projected
  line L6 (13.65, 15) -> (10.9568, 7.8709)
  point P0 (0, -4)
extrude "Extrusion37" add sketch "Sketch40" along normal blind 9.8
sketch "Sketch42" plane through (0, -4.7, 4) normal (0, -1, 0) x (1, 0, 0)
  line L0 (4.25, 0) -> (0, 0) projected
  line L1 (10.25, 6) -> (13.65, 15) projected
  line L2 (0, 0) -> (13.65, 15)
  line L3 (13.65, 15) -> (13.65, 4.5)
  line L4 (13.65, 4.5) -> (6.0124, 0)
  line L5 (0, 0) -> (4.25, 0) projected
  line L6 (6.0124, 0) -> (0, 0)
  point P0 (0, -4)
extrude "Extrusion38" add sketch "Sketch42" against normal blind 9.2
sketch "Sketch45" plane through (19.65, -14.5, 7) normal (0, -1, 0) x (1, 0, 0)
  line L0 (-6, 12) -> (-19.65, -3) projected
  line L1 (-6, 12) -> (-11.8966, 12)
  line L2 (-11.8966, 12) -> (-11.8966, -1.0489)
  line L3 (-11.8966, -1.0489) -> (-6, -1.0489)
  line L4 (-6, -1.0489) -> (-6, 12)
  point P0 (-19.65, -7)
  point P1 (-11.8966, 5.5202)
extrude "Extrusion40" cut sketch "Sketch45" against normal blind 9.8 contours L4 L3 L2 L0
sketch "Sketch46" plane through (0, 4.5, 0) normal (-1, 0, 0) x (0, 0, 1)
  line L0 (-11, -4.5) -> (-0.25, -4.5) projected
  line L1 (-0.25, -4.5) -> (-0.25, -4.25)
  line L2 (-0.25, -4.25) -> (-11, -4.5)
  line L3 (-11, -4.5) -> (-0.25, -4.5)
  line L4 (-0.25, -4.25) -> (-0.25, -4.5)
  point P0 (0, -4.5)
  dimension "d171" = 0.25
extrude "Extrusion41" cut sketch "Sketch46" against normal blind 50
sketch "Sketch47" plane through (0, 4.5, 0) normal (-1, 0, 0) x (0, 0, 1)
  point P0 (0, -4.5)
sketch "Sketch48" plane through (0, 4.5, 0) normal (-1, 0, 0) x (0, 0, 1)
  line L0 (-11, 0) -> (29, 0) projected
  line L1 (-11, 0) -> (2.5115, 0)
  line L2 (2.5115, 0) -> (2.5115, 14.2774)
  line L3 (2.5115, 14.2774) -> (-11, 14.2774)
  line L4 (-11, 14.2774) -> (-11, 0)
  point P0 (0, -4.5)
  point P1 (2.5115, 0)
extrude "Extrusion42" cut sketch "Sketch48" against normal blind 40
sketch "Sketch49" plane through (0, -4.7, 4) normal (-1, 0, 0) x (0, 0, 1)
  line L0 (0, 0) -> (0, 9.2) projected
  line L1 (-15, 9.2) -> (25, 9.2) projected
  line L2 (0, 0) -> (-15, 0)
  line L3 (-15, 0) -> (-15, 9.2)
  line L4 (-15, 9.2) -> (0, 9.2)
  line L5 (0, 9.2) -> (0, 0)
  line L6 (-4.25, 4.95) -> (-15, 4.7) projected
  line L7 (-15, 4.7) -> (-4.25, 4.95)
  line L8 (-4.25, 0) -> (3, 0) projected
  line L9 (-4.25, 4.95) -> (-4.25, 0)
  point P0 (-4, 4.7)
extrude "Extrusion43" add sketch "Sketch49" along normal blind 20.65 contours L2 L9 L6 L3 L1 L0
sketch "Sketch50" plane through (0, 4.5, 0) normal (0, 1, 0) x (1, 0, 0)
  line L0 (-20.65, 11) -> (19.65, 11) projected
  line L1 (-20.65, 11) -> (-20.65, 6)
  line L2 (-20.65, -4) -> (-20.65, 11) projected
  line L3 (-20.65, 6) -> (-14.825, 6)
  circle A0 centre (-14.825, 6) radius 2.5
  line L4 (-14.825, 6) -> (-6.825, 6)
  circle A1 centre (-6.825, 6) radius 2.5
  point P0 (0, 0)
  dimension "d179" = 5
  dimension "d180" = 5.825
  dimension "d181" = 5
  dimension "d182" = 8
  dimension "d183" = 5
extrude "Extrusion44" cut sketch "Sketch50" against normal blind 2
sketch "Sketch51" plane through (-14.825, 2.5, -6) normal (0, 1, 0) x (1, 0, 0)
  circle A0 centre (0, 0) radius 1.05
  circle A1 centre (8, 0) radius 2.5 projected
  circle A2 centre (8, 0) radius 1.05
  point P0 (14.825, -6)
  dimension "d186" = 2.1
  dimension "d187" = 2.1
extrude "Extrusion45" cut sketch "Sketch51" against normal blind 10 contours A0 | A2
sketch "Sketch52" plane through (19.65, 0, -11) normal (0, 0, -1) x (-1, 0, 0)
  line L0 (0, -2.4305) -> (0, 1.4305) projected
  line L1 (40.3, 4.5) -> (0, 4.5) projected
  line L2 (0, 0) -> (40.3, 0)
  line L3 (40.3, 0) -> (40.3, 4.5)
  line L4 (40.3, 4.5) -> (0, 4.5)
  line L5 (0, 4.5) -> (0, 0)
  point P0 (19.65, 0)
extrude "Extrusion46" add sketch "Sketch52" along normal blind 5
sketch "Sketch53" plane through (19.65, 0, -16) normal (0, 0, -1) x (-1, 0, 0)
  line L0 (0, 4.5) -> (0, 0) projected
  line L1 (40.3, 0) -> (40.3, 0.25) projected
  line L2 (0, 4.5) -> (40.3, 4.5)
  line L3 (40.3, 4.5) -> (40.3, 0)
  line L4 (40.3, 0) -> (0, 0)
  line L5 (0, 0) -> (0, 4.5)
  line L6 (40.3, -4.7) -> (40.3, 4.5) projected
  line L7 (40.3, 4.5) -> (0, 4.5)
  line L8 (0, 4.5) -> (0, 15.5)
  line L9 (0, 15.5) -> (40.3, 15.5)
  line L10 (40.3, 15.5) -> (40.3, 4.5)
  point P0 (19.65, 0)
  dimension "d192" = 11
extrude "Extrusion47" add sketch "Sketch53" against normal blind 4 contours L8 L9 L10 L2
sketch "Sketch54" plane through (19.65, 0, -12) normal (0, 0, 1) x (1, 0, 0)
  line L0 (0, 4.5) -> (-40.3, 4.5) projected
  line L1 (-40.3, 4.5) -> (-37, 4.5)
  line L2 (-37, 4.5) -> (-37, 7.5)
  arc A0 (-38.6, 7.5) -> (-35.4, 7.5) centre (-37, 7.5) ccw
  line L3 (-37, 7.5) -> (-37, 10.5)
  arc A1 (-35.4, 10.5) -> (-38.6, 10.5) centre (-37, 10.5) ccw
  line L4 (-35.4, 10.5) -> (-35.4, 7.5)
  line L5 (-38.6, 10.5) -> (-38.6, 7.5)
  line L6 (-37, 5.9) -> (-29, 5.9)
  line L7 (-33, 5.9) -> (-33, 4.7724)
  arc A2 (-30.6, 7.5) -> (-27.4, 7.5) centre (-29, 7.5) ccw
  arc A3 (-27.4, 10.5) -> (-30.6, 10.5) centre (-29, 10.5) ccw
  line L8 (-30.6, 10.5) -> (-30.6, 7.5)
  line L9 (-27.4, 10.5) -> (-27.4, 7.5)
  line L10 (-29, 5.9) -> (-12, 5.9)
  line L11 (-20.5, 5.9) -> (-20.5, 4.7724)
  arc A4 (-10.4, 10.5) -> (-13.6, 10.5) centre (-12, 10.5) ccw
  line L12 (-10.4, 10.5) -> (-10.4, 7.5)
  arc A5 (-13.6, 7.5) -> (-10.4, 7.5) centre (-12, 7.5) ccw
  line L13 (-13.6, 10.5) -> (-13.6, 7.5)
  point P0 (-19.65, 0)
  dimension "d195" = 3.3
  dimension "d196" = 3
  dimension "d197" = 3.2
  dimension "d198" = 3
  dimension "d199" = 3.2
  dimension "d200" = 8
  dimension "d201" = 17
extrude "Extrusion48" cut sketch "Sketch54" against normal blind 4
chamfer "Chamfer13" distance 2 angle 45 1 edges at (-0.5, 0, -16)
sketch "Sketch55" plane through (13.65, -3.5, 0) normal (-1, 0, 0) x (0, 0, 1)
  circle A0 centre (24, 3) radius 1.9305 projected
  circle A1 centre (24, 3) radius 1
  circle A2 centre (24, -6) radius 1.9305 projected
  circle A3 centre (24, -6) radius 1
  point P0 (0, 3.5)
  dimension "d210" = 2
  dimension "d211" = 2
extrude "Extrusion49" add sketch "Sketch55" against normal blind 6
sketch "Sketch56" plane through (13.65, -3.5, 0) normal (-1, 0, 0) x (0, 0, 1)
  line L0 (29, -11) -> (7, -11) projected
  line L1 (29, 8) -> (29, -11) projected
  line L2 (7, -11) -> (29, -11)
  line L3 (29, -11) -> (29, 8)
  line L4 (29, 8) -> (7, 8)
  line L5 (7, 8) -> (7, -11)
  circle A0 centre (24, 3) radius 1 projected
  circle A1 centre (24, 3) radius 1
  circle A2 centre (24, -6) radius 1 projected
  circle A3 centre (24, -6) radius 1
  point P0 (0, 3.5)
  dimension "d214" = 2
extrude "Extrusion50" add sketch "Sketch56" along normal blind 2
chamfer "Chamfer16" distance 8 angle 48 1 edges at (11.65, -9.6, 7) measured on face at (16.9833, -11.2333, 7)
chamfer "Chamfer17" distance 2 angle 45 1 edges at (11.65, -5, 29)
properties part number "Non_compliant_plate3"
